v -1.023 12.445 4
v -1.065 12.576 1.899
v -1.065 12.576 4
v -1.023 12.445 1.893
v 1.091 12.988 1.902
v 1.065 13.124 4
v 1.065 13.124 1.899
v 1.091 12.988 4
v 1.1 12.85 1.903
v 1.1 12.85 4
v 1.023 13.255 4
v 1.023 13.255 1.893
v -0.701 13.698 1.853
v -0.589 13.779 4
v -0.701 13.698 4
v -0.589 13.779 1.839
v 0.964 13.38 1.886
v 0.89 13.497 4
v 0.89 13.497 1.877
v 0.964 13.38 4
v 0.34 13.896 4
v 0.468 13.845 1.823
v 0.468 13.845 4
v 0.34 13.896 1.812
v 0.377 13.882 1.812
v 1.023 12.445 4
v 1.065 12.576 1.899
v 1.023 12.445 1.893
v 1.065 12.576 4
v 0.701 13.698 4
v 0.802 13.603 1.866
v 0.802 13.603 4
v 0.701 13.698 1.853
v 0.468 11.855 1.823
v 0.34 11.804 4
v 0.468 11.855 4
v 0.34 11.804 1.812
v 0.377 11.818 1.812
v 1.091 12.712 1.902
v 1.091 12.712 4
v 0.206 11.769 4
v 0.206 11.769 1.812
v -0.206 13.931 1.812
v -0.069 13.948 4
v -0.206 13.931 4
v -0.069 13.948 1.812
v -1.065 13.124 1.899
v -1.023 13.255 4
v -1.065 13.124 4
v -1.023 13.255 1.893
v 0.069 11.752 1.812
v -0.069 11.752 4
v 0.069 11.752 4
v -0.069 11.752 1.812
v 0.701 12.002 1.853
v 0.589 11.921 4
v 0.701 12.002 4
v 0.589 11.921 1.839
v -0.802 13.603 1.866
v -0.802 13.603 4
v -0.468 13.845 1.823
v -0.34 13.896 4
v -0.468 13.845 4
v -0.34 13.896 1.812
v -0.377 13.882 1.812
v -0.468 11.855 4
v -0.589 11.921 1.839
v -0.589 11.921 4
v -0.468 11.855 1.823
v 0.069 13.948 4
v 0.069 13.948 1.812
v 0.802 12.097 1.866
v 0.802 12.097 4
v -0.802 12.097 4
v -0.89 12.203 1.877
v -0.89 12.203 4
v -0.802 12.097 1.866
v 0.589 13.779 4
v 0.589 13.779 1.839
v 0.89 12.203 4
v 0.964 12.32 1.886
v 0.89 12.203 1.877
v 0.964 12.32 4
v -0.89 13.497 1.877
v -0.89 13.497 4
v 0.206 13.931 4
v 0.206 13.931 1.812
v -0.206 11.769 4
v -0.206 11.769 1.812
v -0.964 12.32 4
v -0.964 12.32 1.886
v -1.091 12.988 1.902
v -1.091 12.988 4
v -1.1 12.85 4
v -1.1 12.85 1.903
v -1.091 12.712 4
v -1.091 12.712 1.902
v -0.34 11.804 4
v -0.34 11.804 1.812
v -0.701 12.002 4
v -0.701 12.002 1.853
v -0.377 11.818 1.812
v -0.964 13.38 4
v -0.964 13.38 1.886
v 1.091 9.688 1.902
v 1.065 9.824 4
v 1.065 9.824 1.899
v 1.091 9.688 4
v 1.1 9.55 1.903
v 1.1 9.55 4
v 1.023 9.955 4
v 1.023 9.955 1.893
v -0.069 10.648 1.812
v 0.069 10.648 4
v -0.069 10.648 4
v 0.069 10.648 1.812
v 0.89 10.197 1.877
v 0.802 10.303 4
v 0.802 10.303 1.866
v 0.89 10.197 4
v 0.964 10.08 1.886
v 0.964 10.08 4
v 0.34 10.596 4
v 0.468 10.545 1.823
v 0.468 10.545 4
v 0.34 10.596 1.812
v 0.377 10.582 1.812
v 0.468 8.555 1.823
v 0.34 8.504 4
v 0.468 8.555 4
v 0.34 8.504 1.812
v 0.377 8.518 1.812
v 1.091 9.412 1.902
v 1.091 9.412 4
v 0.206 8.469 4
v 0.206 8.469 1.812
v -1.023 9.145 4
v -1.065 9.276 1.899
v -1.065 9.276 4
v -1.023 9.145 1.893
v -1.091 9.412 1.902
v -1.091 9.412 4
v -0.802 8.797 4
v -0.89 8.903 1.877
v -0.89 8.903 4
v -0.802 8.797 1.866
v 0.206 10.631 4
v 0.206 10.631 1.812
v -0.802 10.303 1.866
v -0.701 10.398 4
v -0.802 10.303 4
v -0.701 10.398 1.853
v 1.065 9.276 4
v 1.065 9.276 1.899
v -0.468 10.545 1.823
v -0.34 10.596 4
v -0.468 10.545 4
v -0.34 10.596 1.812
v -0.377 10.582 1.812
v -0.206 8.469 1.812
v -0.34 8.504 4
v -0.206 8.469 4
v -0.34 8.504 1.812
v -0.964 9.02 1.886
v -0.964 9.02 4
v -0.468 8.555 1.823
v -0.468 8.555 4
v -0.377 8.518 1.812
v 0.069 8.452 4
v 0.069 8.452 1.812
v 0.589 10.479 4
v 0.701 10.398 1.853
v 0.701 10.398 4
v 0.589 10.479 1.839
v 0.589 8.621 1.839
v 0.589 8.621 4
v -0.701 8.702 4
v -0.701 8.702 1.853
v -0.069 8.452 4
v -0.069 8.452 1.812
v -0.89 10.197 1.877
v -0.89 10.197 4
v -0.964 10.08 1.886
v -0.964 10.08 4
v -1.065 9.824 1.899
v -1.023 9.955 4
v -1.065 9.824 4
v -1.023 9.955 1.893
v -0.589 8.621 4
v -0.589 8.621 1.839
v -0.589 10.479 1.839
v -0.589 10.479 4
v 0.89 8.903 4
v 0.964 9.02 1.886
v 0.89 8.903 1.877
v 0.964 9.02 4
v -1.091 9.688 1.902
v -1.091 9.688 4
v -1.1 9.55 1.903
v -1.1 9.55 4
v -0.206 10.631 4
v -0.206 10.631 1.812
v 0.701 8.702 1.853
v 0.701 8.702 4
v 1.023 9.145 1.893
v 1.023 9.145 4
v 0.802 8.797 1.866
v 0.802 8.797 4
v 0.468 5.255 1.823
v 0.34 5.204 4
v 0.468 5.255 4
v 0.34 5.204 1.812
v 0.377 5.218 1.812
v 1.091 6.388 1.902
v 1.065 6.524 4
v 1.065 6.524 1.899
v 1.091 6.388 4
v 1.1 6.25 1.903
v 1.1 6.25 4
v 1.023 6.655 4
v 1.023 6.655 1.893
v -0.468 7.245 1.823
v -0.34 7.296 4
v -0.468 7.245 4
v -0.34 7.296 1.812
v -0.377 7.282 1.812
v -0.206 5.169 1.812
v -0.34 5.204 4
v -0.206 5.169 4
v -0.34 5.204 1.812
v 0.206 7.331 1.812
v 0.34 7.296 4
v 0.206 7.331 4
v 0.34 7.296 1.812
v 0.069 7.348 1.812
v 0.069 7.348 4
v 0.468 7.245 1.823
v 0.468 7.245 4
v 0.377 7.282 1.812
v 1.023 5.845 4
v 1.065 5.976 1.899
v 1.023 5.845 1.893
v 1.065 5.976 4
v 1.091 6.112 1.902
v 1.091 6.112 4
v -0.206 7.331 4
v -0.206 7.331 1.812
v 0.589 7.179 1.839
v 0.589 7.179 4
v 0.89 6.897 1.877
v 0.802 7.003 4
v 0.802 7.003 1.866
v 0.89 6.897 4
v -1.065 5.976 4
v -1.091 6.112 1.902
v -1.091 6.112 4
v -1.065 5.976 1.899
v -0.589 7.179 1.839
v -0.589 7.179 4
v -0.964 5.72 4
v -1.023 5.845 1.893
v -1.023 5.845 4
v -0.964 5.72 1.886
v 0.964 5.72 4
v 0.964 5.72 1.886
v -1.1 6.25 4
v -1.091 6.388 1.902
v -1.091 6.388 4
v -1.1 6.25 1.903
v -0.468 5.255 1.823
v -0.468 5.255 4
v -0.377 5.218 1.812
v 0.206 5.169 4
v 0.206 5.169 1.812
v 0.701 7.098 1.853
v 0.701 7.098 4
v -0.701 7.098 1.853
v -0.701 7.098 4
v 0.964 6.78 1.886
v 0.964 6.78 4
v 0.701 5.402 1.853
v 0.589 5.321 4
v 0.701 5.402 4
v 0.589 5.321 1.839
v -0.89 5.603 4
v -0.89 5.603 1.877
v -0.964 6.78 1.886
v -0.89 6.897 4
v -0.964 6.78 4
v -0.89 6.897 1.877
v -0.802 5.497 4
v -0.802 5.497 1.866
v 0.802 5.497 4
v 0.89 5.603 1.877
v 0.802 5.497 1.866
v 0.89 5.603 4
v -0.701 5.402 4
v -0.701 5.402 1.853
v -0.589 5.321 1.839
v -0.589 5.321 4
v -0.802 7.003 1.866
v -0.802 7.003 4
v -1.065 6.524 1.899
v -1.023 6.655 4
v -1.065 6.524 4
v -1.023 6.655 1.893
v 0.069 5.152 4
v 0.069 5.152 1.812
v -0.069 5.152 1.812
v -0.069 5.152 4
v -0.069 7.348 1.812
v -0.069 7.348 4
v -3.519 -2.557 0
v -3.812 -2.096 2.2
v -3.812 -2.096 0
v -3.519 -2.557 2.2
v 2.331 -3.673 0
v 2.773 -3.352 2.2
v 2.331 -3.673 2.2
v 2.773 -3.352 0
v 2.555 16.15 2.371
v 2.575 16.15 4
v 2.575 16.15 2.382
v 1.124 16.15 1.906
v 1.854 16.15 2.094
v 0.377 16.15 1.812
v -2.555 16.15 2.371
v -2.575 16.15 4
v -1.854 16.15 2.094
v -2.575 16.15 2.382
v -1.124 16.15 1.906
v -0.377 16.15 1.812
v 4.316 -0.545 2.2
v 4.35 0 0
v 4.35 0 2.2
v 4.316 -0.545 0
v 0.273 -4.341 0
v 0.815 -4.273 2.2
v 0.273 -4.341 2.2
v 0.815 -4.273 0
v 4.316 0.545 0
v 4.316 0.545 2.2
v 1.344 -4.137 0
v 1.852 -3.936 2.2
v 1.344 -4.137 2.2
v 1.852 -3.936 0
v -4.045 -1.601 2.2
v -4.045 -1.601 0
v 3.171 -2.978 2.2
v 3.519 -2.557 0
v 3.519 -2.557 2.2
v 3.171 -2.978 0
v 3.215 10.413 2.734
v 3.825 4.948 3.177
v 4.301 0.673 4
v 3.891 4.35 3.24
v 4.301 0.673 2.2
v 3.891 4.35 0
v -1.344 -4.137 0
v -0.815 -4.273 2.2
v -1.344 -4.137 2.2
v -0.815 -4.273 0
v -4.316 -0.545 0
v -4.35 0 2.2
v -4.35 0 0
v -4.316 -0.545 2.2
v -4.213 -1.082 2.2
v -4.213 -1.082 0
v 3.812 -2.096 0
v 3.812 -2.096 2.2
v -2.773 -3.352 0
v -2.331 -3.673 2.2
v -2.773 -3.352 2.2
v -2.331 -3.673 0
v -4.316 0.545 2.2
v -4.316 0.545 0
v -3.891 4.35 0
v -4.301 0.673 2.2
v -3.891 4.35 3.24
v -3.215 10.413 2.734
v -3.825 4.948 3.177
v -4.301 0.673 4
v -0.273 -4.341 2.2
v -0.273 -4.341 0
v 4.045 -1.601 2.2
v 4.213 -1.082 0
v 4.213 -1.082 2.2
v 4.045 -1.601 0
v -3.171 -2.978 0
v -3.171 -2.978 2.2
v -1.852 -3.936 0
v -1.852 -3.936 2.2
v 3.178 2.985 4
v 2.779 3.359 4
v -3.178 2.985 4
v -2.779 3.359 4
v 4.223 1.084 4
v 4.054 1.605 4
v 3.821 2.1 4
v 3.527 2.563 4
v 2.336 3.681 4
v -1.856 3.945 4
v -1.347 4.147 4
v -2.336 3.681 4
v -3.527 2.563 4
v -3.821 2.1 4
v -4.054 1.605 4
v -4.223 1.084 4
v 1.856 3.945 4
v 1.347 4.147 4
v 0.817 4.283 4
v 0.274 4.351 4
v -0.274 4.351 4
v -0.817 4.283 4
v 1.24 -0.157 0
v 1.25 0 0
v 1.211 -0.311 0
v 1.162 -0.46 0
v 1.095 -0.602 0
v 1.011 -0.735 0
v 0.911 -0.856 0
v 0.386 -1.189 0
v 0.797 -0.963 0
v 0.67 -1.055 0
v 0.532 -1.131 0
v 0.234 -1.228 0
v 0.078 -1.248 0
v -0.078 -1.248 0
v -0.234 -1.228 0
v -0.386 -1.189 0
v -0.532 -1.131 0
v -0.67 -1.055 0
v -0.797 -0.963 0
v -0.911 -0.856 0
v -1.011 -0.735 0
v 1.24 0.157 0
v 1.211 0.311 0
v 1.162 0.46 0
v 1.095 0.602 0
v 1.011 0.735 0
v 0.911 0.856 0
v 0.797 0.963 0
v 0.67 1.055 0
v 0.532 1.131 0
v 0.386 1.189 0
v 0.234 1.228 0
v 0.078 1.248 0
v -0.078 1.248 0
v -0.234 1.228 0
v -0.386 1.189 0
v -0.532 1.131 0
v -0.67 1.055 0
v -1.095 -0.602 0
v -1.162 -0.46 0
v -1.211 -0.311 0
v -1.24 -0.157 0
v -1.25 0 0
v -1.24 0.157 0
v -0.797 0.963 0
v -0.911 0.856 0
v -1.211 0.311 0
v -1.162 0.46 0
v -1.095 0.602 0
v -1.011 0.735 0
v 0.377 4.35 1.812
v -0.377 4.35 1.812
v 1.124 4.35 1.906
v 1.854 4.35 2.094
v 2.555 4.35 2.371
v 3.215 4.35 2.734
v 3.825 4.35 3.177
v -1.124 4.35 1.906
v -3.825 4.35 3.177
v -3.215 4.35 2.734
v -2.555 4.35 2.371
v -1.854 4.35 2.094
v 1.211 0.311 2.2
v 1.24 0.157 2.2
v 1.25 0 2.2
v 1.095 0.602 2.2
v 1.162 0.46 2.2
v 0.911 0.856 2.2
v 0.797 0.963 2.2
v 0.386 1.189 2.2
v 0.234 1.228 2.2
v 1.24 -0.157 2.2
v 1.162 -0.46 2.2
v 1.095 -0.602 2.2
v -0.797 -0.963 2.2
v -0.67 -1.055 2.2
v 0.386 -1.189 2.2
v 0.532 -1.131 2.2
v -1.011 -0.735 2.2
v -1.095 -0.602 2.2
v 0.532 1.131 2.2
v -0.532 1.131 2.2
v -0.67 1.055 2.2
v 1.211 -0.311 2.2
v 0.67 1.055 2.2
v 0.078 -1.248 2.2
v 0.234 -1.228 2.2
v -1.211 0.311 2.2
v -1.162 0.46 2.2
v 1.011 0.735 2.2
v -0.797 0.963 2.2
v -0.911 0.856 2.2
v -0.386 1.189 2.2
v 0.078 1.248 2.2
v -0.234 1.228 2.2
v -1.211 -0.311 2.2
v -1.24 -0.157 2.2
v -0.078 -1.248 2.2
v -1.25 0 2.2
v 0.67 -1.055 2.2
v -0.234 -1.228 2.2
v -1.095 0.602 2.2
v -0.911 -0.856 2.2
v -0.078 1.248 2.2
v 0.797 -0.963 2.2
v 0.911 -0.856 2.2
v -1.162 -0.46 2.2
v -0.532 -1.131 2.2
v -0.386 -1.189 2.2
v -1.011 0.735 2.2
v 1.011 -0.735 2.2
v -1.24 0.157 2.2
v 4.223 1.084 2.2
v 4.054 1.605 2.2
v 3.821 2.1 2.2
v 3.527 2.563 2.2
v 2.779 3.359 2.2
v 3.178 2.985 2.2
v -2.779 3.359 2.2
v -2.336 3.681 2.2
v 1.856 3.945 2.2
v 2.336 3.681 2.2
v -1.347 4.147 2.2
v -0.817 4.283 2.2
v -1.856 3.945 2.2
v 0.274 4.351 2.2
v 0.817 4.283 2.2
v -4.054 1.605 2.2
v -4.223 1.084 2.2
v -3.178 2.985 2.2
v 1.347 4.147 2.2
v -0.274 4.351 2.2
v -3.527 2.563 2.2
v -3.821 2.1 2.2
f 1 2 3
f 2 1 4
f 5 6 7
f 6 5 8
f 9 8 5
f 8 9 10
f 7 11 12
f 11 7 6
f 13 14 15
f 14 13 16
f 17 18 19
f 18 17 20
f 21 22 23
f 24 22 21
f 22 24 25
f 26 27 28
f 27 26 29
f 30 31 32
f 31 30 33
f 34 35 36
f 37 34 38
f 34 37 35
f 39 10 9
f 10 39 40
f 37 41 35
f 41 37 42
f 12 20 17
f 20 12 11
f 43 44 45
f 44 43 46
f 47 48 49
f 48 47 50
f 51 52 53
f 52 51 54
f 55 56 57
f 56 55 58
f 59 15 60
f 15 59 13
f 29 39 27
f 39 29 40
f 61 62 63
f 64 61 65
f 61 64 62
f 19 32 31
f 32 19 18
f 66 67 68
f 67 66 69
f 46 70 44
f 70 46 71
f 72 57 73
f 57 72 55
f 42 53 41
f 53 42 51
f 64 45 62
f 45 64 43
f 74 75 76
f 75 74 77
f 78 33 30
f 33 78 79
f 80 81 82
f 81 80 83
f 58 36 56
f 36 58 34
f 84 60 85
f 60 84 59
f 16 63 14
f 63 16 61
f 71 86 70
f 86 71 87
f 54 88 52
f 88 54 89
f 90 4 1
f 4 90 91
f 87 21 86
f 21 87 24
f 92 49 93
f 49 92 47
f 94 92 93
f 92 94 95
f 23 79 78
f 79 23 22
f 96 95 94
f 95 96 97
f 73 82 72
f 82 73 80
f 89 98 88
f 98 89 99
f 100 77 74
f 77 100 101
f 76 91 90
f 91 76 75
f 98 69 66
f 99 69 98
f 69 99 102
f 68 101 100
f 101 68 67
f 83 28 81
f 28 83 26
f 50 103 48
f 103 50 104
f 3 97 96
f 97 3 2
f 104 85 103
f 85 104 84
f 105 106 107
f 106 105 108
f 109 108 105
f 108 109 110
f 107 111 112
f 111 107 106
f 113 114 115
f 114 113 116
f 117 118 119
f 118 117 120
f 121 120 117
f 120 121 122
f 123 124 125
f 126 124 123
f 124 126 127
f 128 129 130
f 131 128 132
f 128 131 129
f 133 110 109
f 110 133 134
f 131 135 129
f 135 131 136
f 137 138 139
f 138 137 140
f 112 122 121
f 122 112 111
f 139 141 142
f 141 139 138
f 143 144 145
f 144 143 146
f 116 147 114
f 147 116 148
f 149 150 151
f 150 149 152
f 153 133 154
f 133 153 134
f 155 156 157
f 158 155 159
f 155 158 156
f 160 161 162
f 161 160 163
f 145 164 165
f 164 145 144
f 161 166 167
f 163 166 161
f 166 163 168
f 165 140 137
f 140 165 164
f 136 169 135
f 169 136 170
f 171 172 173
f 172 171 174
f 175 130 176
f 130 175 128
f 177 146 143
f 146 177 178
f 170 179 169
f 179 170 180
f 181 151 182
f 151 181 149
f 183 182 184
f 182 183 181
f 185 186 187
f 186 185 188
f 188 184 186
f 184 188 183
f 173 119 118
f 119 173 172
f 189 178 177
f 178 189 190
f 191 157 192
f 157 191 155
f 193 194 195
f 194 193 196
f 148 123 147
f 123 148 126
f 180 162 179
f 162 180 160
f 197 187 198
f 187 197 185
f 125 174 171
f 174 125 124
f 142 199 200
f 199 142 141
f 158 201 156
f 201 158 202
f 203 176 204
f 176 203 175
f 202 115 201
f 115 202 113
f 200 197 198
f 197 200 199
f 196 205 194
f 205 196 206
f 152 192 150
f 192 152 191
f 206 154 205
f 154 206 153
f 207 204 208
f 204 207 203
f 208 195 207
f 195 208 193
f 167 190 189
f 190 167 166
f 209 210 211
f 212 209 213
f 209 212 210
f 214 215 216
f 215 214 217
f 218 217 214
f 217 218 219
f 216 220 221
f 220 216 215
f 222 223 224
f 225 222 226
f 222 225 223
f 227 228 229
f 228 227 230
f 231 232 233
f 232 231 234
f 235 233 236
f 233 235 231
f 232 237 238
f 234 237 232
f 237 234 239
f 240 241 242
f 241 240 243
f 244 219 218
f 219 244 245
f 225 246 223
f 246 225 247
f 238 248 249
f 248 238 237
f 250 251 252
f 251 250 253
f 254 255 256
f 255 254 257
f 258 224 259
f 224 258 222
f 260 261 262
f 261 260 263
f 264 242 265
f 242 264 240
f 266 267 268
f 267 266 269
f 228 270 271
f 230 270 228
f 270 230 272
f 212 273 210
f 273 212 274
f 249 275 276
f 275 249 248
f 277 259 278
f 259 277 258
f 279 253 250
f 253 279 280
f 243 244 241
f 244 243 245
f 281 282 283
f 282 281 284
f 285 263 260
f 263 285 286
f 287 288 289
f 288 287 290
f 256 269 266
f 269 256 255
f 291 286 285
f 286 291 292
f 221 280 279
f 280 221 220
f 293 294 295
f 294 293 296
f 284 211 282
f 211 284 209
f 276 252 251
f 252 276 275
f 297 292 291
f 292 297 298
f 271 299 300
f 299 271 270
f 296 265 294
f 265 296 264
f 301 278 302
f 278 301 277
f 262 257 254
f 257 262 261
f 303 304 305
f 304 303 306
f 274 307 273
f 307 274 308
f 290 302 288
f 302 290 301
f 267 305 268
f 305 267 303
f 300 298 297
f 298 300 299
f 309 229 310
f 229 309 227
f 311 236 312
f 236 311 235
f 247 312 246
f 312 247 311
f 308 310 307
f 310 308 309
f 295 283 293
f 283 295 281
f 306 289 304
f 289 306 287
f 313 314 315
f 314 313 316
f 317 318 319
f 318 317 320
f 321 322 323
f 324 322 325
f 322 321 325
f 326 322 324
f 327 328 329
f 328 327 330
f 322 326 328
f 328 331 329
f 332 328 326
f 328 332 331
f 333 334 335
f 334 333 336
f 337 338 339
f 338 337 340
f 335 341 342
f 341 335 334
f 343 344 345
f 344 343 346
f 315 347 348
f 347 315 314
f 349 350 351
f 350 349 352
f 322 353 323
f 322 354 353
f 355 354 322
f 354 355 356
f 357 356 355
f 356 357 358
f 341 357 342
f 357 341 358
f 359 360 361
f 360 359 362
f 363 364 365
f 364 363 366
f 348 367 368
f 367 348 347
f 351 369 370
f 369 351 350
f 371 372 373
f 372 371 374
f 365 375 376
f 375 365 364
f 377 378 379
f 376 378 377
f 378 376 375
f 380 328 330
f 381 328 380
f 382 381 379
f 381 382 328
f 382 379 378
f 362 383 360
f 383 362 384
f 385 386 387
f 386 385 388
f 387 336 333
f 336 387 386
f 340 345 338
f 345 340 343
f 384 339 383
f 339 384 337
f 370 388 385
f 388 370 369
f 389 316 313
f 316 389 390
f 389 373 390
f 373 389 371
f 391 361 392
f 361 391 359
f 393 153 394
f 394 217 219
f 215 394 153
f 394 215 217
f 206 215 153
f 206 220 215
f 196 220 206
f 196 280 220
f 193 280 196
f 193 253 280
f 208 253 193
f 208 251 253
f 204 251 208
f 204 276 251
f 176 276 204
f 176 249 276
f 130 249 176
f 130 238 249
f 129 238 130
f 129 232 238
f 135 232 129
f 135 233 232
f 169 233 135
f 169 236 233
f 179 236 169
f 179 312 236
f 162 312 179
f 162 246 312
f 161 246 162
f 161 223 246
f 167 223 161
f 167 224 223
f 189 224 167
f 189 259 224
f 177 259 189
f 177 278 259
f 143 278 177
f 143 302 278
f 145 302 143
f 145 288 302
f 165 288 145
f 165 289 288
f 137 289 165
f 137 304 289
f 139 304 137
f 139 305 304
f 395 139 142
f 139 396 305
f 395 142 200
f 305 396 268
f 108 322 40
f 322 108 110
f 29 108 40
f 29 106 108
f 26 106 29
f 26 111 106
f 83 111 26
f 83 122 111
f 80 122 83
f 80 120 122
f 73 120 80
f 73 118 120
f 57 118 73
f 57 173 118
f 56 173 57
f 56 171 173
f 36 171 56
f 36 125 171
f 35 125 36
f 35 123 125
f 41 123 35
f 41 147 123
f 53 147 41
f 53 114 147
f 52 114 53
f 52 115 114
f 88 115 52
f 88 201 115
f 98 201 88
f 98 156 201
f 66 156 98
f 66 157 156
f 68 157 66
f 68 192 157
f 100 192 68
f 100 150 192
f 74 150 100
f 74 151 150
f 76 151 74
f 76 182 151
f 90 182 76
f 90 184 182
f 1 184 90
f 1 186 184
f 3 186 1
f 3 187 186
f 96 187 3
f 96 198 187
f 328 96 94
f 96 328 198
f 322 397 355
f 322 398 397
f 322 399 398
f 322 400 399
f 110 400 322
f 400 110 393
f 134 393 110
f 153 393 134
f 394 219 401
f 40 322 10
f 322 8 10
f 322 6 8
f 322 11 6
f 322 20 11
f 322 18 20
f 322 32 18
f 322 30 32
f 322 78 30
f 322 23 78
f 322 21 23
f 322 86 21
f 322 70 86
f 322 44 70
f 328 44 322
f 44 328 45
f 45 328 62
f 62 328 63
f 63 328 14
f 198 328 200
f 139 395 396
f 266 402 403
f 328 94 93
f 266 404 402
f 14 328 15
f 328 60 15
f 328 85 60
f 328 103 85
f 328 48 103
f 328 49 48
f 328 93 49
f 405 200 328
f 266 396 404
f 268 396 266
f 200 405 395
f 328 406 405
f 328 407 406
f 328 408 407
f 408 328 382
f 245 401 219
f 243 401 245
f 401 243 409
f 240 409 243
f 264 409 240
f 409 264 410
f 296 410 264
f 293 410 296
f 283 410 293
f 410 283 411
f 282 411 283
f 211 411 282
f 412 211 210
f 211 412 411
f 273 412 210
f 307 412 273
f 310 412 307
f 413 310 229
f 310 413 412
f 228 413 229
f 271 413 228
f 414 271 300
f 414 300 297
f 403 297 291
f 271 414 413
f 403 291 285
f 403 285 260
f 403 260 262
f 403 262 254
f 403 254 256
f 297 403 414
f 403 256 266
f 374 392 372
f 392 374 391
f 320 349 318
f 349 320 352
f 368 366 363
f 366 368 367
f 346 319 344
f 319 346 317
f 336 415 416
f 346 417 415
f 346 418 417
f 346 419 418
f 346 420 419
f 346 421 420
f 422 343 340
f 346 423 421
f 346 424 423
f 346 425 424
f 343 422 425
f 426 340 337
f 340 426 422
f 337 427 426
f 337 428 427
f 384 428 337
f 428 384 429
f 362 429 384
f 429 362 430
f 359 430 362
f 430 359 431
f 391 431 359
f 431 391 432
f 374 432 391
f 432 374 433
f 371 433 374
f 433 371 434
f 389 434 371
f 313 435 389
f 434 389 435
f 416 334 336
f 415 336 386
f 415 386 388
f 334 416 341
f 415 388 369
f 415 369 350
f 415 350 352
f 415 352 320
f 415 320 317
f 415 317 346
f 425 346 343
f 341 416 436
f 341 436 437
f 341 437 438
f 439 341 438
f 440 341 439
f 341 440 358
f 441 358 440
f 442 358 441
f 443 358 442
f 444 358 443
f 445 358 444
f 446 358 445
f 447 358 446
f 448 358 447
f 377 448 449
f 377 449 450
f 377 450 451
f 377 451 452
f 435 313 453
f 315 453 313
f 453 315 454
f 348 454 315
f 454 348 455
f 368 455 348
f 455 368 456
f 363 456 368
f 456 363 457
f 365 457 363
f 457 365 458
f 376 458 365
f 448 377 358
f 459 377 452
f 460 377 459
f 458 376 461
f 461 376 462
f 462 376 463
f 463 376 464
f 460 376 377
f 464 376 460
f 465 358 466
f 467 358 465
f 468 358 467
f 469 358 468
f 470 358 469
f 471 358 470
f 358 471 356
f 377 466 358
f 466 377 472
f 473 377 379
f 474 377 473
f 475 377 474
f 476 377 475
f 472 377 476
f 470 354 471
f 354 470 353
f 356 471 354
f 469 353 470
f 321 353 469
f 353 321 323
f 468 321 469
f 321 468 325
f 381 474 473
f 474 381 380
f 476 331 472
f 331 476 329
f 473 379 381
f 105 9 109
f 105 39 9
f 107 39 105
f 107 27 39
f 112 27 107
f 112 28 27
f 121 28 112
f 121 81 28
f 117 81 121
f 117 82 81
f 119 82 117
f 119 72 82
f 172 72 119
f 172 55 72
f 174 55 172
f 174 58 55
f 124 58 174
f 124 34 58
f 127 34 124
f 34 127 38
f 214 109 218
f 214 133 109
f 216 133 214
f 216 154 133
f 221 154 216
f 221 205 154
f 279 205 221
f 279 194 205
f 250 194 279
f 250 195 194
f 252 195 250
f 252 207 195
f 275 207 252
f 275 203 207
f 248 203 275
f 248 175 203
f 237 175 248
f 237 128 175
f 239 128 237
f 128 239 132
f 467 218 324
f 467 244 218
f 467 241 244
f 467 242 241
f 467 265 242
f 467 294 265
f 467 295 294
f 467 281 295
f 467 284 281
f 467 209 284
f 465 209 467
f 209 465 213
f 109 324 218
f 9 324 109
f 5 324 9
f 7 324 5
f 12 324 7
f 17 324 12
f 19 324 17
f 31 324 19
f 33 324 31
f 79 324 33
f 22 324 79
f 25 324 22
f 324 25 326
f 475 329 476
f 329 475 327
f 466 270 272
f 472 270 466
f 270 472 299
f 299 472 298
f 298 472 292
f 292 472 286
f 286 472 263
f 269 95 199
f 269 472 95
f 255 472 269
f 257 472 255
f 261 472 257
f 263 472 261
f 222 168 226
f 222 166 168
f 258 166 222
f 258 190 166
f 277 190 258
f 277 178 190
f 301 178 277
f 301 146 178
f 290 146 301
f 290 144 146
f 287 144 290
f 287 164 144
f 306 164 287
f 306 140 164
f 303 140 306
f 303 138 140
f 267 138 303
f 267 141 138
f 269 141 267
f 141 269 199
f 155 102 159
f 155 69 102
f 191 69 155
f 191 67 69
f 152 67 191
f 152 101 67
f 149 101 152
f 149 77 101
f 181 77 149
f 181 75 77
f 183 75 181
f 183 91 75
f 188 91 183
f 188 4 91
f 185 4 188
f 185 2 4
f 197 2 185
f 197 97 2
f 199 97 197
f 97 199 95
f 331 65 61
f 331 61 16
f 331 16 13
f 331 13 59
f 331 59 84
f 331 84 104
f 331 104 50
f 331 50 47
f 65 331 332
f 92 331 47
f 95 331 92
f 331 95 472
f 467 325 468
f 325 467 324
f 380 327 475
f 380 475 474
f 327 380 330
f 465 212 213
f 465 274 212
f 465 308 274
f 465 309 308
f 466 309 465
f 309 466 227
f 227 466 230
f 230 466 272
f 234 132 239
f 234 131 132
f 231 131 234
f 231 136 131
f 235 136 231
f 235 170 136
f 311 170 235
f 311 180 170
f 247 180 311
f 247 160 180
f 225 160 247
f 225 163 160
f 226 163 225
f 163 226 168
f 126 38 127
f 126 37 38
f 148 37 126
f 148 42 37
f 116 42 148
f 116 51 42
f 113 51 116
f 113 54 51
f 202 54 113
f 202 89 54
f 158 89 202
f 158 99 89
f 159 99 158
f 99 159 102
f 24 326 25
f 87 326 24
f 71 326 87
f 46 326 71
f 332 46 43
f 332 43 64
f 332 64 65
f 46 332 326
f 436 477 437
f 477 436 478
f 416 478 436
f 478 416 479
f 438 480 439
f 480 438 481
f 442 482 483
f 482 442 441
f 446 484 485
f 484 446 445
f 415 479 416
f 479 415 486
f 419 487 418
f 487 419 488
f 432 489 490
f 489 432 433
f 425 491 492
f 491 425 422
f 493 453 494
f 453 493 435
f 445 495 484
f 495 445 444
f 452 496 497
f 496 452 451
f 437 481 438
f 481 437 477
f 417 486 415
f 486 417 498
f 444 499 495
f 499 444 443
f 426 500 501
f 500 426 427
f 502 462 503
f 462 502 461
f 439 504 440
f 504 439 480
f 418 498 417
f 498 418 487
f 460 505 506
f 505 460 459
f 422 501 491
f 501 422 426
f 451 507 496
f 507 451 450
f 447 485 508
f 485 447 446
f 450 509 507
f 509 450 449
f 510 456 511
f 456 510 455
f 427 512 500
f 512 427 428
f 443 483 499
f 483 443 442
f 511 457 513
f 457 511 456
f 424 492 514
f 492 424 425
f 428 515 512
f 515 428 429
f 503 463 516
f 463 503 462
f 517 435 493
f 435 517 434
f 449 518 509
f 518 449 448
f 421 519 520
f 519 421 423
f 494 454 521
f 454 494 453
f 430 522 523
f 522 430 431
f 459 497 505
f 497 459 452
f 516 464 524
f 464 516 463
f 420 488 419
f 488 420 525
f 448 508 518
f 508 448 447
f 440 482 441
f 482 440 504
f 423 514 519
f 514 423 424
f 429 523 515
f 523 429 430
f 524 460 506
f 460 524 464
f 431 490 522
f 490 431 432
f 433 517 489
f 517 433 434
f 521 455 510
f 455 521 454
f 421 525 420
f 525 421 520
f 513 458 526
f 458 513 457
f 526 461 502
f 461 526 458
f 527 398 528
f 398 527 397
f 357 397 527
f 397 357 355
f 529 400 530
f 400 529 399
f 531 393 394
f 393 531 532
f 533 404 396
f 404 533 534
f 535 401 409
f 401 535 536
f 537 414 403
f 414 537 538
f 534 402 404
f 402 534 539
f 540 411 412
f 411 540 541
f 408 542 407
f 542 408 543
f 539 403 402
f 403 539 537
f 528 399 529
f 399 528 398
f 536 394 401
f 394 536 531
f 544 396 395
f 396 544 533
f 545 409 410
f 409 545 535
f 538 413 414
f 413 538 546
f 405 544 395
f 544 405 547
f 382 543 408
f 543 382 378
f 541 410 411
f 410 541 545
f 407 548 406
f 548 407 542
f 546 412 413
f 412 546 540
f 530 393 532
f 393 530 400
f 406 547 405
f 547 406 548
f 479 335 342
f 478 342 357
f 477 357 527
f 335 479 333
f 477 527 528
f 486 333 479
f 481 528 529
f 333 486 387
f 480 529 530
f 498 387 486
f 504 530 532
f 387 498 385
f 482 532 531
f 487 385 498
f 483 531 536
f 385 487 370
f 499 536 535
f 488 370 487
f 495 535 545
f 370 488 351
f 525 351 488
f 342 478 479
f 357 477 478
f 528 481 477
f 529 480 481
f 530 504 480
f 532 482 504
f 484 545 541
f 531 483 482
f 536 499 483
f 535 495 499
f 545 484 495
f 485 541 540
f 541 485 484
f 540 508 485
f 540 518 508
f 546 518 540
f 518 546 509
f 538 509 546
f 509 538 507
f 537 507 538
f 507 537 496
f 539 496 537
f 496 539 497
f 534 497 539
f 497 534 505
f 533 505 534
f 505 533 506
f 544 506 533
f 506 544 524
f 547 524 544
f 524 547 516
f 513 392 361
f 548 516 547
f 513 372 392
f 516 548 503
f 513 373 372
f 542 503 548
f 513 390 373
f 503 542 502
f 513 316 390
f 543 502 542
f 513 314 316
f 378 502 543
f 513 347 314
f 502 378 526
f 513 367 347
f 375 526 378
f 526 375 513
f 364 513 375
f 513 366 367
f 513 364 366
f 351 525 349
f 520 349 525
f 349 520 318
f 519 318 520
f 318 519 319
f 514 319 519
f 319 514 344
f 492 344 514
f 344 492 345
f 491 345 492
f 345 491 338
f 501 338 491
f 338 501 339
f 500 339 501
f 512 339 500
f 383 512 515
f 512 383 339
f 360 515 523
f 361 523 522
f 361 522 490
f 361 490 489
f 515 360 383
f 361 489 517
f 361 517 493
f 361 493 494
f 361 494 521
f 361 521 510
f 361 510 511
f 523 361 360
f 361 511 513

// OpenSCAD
// RC Yak Replacement Hinge Tab

overlap=0.01;
$fn=50;

hingeRodDia=4.3;

hingeBottomScrewHoleDia=2.5;

hingeAnchorHoleDia=2.2;
hingeAnchorHoleSpacing=3.3;

clipOpeningAngle=70;
clipOpeningInwardShift=1.3;

hingeTabLength=20.5;
hingeTabTipWidth=5.15;
hingeTabThickness=2.2;

hingeRodMarginWidth=2.2;

hingeEndOuterDia=hingeRodDia+hingeRodMarginWidth*2;

earBaseWidth=14;
earThickness=2;
earInnerWidth=hingeEndOuterDia;

tailGuardCurveDia=12;
curveCutInset=1.8;
// Note: when step down is == inset, hinge aligns with inner surface of tail-guard
bottomHingeStepDown=curveCutInset;  

// Calc
tabEndYPosition=hingeTabLength-hingeRodMarginWidth-hingeRodDia/2;

* translate([-15,0,0])
    forkedClipHinge();

* translate([0,0,0])
    forkedClipHinge();

translate([0,0,0])
    bottomHinge();

* translate([15,0,0])
    forkedClipHinge();

/*
 * Usually part of the tail-guard, but glue-in replacement
 * Note: Can't go inside/above tail-guard because that doesn't line
 * up right with the bottom end of the tail hinge.  Needs to be designed
 * to stair-step so it aligns with the surface of the tail-guard.
 */
module bottomHinge() {
    intersection() {
        difference() {
            anchoredHingeTab(tabThickness=hingeTabThickness+bottomHingeStepDown);
            translate([0,0,-overlap])
                cylinder(d=hingeBottomScrewHoleDia, h=hingeTabThickness+bottomHingeStepDown+overlap*2);
            translate([0,0,hingeTabThickness])
                cylinder(d=hingeEndOuterDia+overlap*2, h=bottomHingeStepDown+overlap);
            // under-curve
            translate([0,hingeEndOuterDia/2,curveCutInset])
                difference() {
                    translate([-tailGuardCurveDia/2,0,-curveCutInset-overlap])
                        cube([tailGuardCurveDia,hingeTabLength,tailGuardCurveDia/2+curveCutInset+overlap]);
                    translate([0,0,tailGuardCurveDia/2])
                        rotate([-90,0,0])
                            translate([0,0,-overlap])
                                cylinder(d=tailGuardCurveDia, h=hingeTabLength+overlap*2);
                }
        }

    }
}

module forkedClipHinge() {
    difference() {
        clipHinge();
        translate([-hingeAnchorHoleDia/2,tabEndYPosition-hingeAnchorHoleSpacing*3,-overlap])
            cube([hingeAnchorHoleDia,hingeAnchorHoleSpacing*3+overlap,hingeTabThickness+overlap*2]);
    }
}

module clipHinge() {     
    difference() {
        hingeWithEars();
        translate([0,clipOpeningInwardShift,0])
            rotate([0,0,-90-clipOpeningAngle/2])
                translate([0,0,-overlap])
                    rotate_extrude(angle=clipOpeningAngle) {
                        // note extra width (x-dimension) is to allow it to be shifted toward the center
                        square([hingeRodDia/2+hingeRodMarginWidth*2, hingeTabThickness+overlap*2]);
                    }
    }
}

module hingeWithEars() {
    union() {
        topHinge();
        // ears
        translate([0,hingeRodDia/2,0])
            hull() {
                // wide side
                translate([-earBaseWidth/2,earThickness-overlap,0])
                    cube([earBaseWidth,overlap,hingeTabThickness]);
                // narrow side
                translate([-earInnerWidth/2,0,0])
                    cube([earInnerWidth,overlap,hingeTabThickness]);
            }
    }
}

module topHinge() {
    difference() {
        anchoredHingeTab();
        translate([0,0,-overlap])
            cylinder(d=hingeRodDia, h=hingeTabThickness+overlap*2);
    }
}

module anchoredHingeTab(tabThickness=hingeTabThickness) {     
    difference() {
        hull() {
            cylinder(d=hingeEndOuterDia, h=tabThickness);
            translate([-hingeTabTipWidth/2,tabEndYPosition-overlap,0])
                cube([hingeTabTipWidth,overlap,tabThickness]);
        }
        // anchor holes    
        for (i=[1:3]) {
            translate([0,tabEndYPosition-hingeAnchorHoleSpacing*i,-overlap])
                cylinder(d=hingeAnchorHoleDia, h=tabThickness+overlap*2);    
        }
    }
}
